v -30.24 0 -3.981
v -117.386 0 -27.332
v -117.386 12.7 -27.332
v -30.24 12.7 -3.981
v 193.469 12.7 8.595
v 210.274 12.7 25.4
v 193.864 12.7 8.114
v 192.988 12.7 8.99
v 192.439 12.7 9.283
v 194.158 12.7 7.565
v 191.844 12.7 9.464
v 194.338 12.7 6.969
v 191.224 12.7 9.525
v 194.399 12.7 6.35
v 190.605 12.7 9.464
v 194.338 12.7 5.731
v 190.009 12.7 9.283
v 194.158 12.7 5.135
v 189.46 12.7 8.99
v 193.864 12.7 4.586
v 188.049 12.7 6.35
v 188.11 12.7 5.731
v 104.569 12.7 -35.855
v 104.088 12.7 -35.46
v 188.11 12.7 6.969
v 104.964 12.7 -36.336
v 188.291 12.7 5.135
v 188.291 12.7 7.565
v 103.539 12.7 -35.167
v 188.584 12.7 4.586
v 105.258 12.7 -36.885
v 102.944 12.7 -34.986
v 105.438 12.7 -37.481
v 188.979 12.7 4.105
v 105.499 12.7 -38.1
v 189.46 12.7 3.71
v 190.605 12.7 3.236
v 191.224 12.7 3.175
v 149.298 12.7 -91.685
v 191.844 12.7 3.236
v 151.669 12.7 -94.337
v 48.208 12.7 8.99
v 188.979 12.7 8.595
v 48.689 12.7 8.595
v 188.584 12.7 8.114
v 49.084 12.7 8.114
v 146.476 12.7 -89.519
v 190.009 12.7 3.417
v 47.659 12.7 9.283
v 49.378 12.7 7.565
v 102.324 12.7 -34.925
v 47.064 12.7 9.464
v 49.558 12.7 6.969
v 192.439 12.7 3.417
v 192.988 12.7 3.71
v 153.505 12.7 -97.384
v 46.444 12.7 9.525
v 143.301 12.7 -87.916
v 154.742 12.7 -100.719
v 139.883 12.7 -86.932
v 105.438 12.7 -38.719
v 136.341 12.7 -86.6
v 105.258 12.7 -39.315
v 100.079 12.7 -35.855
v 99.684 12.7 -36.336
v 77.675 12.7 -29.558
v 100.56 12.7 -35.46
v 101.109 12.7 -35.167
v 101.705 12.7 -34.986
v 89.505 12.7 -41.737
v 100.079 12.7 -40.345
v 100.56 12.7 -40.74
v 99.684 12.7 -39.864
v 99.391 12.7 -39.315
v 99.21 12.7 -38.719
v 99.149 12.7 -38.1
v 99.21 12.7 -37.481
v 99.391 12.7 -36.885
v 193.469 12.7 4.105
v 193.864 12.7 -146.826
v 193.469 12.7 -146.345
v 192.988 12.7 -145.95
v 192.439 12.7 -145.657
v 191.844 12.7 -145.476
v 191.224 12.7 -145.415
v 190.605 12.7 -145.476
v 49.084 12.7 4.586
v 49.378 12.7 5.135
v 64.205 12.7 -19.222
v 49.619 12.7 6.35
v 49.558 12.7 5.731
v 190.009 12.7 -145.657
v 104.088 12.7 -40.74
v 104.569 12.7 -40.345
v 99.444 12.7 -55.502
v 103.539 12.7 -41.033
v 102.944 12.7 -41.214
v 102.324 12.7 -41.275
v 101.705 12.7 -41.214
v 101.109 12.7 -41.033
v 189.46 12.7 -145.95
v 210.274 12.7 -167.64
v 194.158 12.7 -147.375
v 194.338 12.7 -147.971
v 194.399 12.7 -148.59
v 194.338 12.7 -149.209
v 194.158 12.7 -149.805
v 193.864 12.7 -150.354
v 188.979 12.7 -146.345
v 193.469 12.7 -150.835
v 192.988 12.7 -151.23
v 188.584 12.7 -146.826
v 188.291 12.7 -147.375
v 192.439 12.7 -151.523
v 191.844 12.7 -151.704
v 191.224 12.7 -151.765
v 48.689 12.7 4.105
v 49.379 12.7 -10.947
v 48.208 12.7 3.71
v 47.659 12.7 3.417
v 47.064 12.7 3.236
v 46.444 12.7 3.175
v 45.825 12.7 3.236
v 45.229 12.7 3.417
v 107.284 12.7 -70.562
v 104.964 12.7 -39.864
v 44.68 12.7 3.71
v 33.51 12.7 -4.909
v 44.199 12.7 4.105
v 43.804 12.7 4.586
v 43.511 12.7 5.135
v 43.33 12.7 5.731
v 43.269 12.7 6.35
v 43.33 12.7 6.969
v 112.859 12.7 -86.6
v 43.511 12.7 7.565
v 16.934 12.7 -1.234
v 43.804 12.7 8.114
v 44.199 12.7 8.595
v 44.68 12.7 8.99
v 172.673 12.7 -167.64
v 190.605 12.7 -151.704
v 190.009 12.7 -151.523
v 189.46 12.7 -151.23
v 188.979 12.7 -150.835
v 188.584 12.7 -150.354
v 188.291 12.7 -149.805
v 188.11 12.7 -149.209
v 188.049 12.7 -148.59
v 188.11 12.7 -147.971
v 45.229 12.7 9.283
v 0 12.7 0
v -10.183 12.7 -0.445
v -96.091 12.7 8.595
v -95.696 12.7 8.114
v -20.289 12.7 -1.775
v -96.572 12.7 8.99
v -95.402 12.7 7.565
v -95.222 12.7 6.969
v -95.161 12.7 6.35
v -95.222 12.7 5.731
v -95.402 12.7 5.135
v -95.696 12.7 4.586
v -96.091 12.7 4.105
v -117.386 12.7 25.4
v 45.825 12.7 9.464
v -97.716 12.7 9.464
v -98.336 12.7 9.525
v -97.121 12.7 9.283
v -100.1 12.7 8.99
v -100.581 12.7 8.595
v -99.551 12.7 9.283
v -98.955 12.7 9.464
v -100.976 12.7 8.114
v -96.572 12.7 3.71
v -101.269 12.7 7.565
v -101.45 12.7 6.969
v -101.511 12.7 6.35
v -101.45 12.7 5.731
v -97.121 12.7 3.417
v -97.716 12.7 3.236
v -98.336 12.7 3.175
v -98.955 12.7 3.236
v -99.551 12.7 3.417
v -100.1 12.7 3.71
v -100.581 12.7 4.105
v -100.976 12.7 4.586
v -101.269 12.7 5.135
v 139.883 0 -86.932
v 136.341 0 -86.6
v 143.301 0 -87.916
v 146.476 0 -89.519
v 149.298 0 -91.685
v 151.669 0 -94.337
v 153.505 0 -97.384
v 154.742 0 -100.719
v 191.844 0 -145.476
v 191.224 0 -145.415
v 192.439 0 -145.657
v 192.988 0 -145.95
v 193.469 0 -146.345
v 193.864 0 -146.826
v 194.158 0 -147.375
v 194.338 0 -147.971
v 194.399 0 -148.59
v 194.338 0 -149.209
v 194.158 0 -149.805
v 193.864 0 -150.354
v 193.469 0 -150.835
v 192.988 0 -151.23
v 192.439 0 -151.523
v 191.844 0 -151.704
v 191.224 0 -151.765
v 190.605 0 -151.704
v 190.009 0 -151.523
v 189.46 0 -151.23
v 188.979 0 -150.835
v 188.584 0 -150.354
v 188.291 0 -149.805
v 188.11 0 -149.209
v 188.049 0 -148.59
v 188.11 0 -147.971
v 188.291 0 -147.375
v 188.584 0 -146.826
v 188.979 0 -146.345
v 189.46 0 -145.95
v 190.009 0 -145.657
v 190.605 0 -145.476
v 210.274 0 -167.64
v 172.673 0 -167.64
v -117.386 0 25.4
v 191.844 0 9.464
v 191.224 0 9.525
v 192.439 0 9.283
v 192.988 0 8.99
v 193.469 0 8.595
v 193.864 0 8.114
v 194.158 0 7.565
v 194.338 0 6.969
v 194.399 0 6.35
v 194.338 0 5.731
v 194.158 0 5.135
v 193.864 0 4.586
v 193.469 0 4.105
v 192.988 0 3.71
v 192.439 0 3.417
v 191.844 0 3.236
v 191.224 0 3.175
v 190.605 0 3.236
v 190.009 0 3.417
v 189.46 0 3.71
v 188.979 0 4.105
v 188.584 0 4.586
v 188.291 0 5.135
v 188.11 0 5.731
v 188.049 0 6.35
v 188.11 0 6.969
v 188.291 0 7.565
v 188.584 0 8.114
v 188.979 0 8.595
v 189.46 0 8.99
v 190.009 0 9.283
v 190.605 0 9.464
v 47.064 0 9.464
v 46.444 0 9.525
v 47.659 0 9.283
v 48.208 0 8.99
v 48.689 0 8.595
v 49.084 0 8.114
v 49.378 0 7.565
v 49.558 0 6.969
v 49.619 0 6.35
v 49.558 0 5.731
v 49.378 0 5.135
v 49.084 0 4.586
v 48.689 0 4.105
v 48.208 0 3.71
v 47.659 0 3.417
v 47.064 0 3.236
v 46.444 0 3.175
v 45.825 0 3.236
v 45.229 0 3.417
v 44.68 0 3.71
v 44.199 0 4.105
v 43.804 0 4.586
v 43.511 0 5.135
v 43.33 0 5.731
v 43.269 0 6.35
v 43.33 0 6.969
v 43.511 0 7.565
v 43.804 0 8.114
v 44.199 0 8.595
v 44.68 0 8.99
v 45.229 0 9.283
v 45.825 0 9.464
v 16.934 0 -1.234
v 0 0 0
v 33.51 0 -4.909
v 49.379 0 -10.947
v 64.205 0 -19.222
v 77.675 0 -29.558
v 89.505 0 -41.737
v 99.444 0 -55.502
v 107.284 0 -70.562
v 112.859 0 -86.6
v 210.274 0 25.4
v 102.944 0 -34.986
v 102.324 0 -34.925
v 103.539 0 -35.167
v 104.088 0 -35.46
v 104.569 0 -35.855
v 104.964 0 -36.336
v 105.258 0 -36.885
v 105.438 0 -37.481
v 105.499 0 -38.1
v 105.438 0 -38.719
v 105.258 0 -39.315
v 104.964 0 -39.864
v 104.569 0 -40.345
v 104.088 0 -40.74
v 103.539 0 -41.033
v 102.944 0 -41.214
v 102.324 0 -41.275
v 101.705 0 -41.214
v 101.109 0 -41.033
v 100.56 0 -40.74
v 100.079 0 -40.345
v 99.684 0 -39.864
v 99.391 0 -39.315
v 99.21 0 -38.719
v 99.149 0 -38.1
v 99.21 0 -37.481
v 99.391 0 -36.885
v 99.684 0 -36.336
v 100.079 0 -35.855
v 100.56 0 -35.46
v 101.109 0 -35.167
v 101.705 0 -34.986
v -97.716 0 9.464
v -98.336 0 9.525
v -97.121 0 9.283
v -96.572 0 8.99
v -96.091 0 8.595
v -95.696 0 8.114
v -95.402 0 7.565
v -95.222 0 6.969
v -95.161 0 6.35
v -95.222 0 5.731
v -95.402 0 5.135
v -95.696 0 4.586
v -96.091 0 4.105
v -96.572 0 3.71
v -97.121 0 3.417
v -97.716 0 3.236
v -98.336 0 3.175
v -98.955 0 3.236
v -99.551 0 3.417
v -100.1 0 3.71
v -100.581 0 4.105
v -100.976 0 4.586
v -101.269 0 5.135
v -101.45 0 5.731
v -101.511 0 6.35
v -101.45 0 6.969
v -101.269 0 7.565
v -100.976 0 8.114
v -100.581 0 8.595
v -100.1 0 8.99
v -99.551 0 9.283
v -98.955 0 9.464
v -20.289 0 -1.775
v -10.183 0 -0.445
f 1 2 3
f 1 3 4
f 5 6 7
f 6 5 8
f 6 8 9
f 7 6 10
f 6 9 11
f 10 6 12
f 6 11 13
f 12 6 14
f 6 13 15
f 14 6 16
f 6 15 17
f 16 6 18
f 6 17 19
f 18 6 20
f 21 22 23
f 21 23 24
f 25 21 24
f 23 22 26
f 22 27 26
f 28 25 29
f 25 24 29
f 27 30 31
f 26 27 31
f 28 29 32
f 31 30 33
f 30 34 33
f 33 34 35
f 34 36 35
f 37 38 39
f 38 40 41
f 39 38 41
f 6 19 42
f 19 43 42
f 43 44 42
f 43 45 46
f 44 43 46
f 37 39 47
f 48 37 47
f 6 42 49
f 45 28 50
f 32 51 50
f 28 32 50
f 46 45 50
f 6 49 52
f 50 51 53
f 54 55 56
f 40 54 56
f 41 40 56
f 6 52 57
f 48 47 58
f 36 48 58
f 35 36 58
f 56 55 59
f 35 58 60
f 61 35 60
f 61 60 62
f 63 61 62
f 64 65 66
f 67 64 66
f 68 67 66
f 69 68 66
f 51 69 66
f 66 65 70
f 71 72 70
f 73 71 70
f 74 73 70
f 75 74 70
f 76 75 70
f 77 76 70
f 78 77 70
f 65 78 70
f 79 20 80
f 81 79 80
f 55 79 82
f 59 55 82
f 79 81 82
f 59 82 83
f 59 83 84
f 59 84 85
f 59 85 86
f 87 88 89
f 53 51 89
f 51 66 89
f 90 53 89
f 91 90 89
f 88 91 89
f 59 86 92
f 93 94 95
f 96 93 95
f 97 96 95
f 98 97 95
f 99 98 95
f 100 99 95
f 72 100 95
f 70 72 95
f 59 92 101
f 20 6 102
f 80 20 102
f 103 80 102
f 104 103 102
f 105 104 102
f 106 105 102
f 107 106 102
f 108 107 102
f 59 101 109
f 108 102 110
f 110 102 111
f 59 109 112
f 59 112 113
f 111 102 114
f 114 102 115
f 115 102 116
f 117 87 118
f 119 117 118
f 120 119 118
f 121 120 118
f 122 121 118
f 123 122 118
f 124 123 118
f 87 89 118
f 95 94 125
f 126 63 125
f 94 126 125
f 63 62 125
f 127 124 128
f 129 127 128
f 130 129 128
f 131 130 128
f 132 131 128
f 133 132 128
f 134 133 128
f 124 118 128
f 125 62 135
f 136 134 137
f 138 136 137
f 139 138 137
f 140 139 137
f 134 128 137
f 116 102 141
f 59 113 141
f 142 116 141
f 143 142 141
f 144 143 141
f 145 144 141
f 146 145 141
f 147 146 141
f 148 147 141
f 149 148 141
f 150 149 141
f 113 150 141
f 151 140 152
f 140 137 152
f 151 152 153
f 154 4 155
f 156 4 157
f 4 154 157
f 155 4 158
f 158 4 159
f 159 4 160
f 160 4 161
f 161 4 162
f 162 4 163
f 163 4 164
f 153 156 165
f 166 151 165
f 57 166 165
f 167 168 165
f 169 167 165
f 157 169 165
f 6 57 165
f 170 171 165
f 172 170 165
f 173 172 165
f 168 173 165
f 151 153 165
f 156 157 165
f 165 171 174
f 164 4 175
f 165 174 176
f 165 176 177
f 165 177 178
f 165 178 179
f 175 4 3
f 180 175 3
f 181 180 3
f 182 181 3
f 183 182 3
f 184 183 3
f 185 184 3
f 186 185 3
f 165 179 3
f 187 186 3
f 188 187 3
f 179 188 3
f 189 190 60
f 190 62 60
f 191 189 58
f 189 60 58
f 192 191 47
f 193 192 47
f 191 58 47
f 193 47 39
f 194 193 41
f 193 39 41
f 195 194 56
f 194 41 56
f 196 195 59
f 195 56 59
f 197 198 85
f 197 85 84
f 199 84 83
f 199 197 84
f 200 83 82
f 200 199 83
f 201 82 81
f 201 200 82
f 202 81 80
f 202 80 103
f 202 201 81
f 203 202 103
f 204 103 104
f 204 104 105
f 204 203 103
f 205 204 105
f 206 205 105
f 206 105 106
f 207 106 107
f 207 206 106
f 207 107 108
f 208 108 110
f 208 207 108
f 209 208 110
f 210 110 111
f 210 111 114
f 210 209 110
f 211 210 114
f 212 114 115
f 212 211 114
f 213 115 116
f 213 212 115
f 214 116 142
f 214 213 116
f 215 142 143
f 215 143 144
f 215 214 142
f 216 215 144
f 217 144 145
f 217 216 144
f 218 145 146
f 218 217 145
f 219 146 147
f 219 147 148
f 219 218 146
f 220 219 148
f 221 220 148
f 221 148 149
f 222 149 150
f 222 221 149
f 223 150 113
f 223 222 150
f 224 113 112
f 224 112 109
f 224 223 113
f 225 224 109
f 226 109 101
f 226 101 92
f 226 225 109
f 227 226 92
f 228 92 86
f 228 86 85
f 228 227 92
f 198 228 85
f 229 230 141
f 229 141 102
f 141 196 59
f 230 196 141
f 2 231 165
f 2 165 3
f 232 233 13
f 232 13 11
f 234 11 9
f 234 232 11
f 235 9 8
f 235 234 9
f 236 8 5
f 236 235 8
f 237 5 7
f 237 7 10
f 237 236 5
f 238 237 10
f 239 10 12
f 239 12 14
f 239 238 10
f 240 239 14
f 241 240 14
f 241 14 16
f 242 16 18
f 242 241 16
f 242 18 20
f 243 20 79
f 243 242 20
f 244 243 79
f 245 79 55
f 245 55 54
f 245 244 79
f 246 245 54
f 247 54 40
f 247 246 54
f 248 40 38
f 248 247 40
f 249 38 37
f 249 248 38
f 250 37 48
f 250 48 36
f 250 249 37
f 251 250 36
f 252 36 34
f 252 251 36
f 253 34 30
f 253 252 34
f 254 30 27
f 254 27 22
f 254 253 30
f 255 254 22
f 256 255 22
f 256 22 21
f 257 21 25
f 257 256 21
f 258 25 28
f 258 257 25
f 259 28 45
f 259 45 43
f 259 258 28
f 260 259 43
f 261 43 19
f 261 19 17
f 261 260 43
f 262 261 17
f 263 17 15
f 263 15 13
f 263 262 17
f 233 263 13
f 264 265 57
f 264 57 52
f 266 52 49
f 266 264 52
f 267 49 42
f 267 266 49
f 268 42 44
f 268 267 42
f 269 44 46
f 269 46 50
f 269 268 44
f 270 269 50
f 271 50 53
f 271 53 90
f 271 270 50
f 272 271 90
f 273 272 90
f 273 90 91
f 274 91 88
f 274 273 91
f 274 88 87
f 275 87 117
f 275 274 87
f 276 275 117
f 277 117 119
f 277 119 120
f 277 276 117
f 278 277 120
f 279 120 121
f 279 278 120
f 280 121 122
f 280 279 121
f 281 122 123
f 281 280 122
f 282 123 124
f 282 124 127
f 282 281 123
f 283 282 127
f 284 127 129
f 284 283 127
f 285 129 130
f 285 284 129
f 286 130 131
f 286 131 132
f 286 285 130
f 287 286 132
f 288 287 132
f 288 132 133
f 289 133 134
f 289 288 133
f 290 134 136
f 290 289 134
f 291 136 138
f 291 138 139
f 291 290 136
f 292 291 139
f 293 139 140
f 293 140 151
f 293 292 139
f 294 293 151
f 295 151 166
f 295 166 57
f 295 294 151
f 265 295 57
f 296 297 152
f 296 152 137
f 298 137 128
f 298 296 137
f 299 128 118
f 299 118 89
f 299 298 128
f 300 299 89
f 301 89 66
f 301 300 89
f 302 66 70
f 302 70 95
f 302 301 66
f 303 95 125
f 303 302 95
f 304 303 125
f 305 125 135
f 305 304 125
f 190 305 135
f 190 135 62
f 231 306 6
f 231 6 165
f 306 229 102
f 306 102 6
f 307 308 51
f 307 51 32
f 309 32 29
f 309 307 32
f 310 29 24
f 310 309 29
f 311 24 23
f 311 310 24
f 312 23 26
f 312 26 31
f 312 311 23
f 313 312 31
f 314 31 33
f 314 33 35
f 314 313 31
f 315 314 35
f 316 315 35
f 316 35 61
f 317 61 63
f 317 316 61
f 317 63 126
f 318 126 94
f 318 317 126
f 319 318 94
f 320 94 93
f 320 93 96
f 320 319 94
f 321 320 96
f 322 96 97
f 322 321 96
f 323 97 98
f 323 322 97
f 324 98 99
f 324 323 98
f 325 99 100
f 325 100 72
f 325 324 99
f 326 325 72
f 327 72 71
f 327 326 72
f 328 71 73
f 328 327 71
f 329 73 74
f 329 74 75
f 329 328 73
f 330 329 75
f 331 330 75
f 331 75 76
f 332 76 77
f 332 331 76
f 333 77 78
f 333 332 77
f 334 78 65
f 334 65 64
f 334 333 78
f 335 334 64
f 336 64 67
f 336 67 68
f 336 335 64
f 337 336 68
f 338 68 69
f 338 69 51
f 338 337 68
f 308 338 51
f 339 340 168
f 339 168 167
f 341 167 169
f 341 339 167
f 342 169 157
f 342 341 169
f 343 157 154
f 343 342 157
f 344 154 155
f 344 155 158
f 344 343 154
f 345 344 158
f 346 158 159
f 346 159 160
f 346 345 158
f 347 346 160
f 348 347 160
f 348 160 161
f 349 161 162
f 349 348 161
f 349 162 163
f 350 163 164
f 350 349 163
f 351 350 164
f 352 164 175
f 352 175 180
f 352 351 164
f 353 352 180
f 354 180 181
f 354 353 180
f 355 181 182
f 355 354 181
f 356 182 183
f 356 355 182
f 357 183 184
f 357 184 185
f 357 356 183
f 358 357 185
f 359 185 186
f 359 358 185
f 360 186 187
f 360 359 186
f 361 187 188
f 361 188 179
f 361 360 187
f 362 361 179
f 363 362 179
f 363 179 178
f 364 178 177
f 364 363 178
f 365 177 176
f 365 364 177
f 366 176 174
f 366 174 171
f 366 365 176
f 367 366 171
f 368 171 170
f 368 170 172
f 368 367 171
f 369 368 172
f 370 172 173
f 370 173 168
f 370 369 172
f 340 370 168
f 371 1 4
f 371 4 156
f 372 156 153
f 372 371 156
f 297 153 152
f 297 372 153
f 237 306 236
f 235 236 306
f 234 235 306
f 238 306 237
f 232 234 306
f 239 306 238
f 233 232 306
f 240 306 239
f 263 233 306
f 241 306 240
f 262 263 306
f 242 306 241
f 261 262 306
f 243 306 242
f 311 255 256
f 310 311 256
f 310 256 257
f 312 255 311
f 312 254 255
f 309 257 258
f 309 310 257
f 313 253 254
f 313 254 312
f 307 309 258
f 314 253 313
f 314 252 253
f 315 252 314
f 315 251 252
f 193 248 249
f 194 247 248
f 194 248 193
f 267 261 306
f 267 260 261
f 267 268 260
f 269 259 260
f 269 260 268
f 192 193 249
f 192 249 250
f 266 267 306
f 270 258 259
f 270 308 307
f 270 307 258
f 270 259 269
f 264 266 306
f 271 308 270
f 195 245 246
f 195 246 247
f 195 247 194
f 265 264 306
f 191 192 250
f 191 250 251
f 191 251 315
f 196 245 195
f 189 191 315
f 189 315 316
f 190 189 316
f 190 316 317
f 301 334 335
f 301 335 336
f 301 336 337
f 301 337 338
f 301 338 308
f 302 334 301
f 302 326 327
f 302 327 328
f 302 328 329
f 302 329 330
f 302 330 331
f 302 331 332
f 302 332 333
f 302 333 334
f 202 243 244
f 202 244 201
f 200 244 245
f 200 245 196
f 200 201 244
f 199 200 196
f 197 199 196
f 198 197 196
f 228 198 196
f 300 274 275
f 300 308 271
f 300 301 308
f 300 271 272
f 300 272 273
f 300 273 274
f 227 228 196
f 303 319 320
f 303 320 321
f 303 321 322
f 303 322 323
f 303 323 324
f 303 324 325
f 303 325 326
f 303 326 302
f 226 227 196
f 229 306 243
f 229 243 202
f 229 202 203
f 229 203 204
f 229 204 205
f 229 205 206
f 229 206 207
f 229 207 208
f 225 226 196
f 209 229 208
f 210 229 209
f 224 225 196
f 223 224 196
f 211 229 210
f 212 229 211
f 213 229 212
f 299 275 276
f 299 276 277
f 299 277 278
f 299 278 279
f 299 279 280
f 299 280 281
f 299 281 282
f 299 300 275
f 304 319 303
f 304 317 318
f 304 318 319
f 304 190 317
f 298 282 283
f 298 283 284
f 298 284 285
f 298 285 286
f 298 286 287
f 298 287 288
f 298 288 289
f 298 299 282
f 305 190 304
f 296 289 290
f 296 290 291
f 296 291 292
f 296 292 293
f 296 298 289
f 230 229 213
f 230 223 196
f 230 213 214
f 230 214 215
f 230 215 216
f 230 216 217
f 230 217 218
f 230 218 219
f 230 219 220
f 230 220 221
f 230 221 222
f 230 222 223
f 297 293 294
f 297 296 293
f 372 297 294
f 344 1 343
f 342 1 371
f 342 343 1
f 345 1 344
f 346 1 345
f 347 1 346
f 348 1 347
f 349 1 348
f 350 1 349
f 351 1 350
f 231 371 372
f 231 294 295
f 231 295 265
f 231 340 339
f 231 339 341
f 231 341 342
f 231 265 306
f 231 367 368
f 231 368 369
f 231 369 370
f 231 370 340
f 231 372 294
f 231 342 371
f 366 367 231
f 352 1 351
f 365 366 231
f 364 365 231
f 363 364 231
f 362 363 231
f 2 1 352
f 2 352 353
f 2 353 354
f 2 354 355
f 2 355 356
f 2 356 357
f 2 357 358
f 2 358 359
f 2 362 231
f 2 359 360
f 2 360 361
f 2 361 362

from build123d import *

# Parameters (mm, degrees)
SKETCH1_R           = 3.175
BOSS_EXTRUDE1_DEPTH = 12.7
FILLET1_R           = 19.05


with BuildPart() as part:
    # Sketch1 → Boss-Extrude1 (new body)
    with BuildSketch(Plane(origin=(0, 0, 0), x_dir=(1, 0, 0), z_dir=(0, 1, 0))):
        with BuildLine():
            ThreePointArc((0, 0), (71.127685365, 24.14459572), (112.858773544, 86.59958277))
            Line((112.858773544, 86.59958277), (150.958773544, 86.59958277))
            Line((150.958773544, 86.59958277), (172.673487895, 167.64))
            Line((172.673487895, 167.64), (210.27435392, 167.64))
            Line((210.27435392, 167.64), (210.27435392, -25.4))
            Line((210.27435392, -25.4), (0, -25.4))
            Line((0, -25.4), (-117.38564608, -25.4))
            Line((-117.38564608, -25.4), (-117.38564608, 27.331720151))
            Line((-117.38564608, 27.331720151), (-30.24041723, 3.981226456))
            ThreePointArc((-30.24041723, 3.981226456), (-15.250680299, 0.999582397), (0, 0))
        make_face()
        with Locations(Location((191.22435392, -6.35, 0), (0, 0, 270))):
            Circle(SKETCH1_R, mode=Mode.SUBTRACT)
        with Locations(Location((191.22435392, 148.59, 0), (0, 0, 270))):
            Circle(SKETCH1_R, mode=Mode.SUBTRACT)
        with Locations(Location((102.32435392, 38.1, 0), (0, 0, 270))):
            Circle(SKETCH1_R, mode=Mode.SUBTRACT)
        with Locations(Location((46.44435392, -6.35, 0), (0, 0, 270))):
            Circle(SKETCH1_R, mode=Mode.SUBTRACT)
        with Locations(Location((-98.33564608, -6.35, 0), (0, 0, 270))):
            Circle(SKETCH1_R, mode=Mode.SUBTRACT)
    extrude(amount=BOSS_EXTRUDE1_DEPTH)

    # Fillet1
    fillet1_edges = [part.edges().sort_by_distance(p)[0] for p in [
        (150.958773544, 6.35, -86.59958277),
    ]]
    fillet(fillet1_edges, radius=FILLET1_R)


solid = part.part
